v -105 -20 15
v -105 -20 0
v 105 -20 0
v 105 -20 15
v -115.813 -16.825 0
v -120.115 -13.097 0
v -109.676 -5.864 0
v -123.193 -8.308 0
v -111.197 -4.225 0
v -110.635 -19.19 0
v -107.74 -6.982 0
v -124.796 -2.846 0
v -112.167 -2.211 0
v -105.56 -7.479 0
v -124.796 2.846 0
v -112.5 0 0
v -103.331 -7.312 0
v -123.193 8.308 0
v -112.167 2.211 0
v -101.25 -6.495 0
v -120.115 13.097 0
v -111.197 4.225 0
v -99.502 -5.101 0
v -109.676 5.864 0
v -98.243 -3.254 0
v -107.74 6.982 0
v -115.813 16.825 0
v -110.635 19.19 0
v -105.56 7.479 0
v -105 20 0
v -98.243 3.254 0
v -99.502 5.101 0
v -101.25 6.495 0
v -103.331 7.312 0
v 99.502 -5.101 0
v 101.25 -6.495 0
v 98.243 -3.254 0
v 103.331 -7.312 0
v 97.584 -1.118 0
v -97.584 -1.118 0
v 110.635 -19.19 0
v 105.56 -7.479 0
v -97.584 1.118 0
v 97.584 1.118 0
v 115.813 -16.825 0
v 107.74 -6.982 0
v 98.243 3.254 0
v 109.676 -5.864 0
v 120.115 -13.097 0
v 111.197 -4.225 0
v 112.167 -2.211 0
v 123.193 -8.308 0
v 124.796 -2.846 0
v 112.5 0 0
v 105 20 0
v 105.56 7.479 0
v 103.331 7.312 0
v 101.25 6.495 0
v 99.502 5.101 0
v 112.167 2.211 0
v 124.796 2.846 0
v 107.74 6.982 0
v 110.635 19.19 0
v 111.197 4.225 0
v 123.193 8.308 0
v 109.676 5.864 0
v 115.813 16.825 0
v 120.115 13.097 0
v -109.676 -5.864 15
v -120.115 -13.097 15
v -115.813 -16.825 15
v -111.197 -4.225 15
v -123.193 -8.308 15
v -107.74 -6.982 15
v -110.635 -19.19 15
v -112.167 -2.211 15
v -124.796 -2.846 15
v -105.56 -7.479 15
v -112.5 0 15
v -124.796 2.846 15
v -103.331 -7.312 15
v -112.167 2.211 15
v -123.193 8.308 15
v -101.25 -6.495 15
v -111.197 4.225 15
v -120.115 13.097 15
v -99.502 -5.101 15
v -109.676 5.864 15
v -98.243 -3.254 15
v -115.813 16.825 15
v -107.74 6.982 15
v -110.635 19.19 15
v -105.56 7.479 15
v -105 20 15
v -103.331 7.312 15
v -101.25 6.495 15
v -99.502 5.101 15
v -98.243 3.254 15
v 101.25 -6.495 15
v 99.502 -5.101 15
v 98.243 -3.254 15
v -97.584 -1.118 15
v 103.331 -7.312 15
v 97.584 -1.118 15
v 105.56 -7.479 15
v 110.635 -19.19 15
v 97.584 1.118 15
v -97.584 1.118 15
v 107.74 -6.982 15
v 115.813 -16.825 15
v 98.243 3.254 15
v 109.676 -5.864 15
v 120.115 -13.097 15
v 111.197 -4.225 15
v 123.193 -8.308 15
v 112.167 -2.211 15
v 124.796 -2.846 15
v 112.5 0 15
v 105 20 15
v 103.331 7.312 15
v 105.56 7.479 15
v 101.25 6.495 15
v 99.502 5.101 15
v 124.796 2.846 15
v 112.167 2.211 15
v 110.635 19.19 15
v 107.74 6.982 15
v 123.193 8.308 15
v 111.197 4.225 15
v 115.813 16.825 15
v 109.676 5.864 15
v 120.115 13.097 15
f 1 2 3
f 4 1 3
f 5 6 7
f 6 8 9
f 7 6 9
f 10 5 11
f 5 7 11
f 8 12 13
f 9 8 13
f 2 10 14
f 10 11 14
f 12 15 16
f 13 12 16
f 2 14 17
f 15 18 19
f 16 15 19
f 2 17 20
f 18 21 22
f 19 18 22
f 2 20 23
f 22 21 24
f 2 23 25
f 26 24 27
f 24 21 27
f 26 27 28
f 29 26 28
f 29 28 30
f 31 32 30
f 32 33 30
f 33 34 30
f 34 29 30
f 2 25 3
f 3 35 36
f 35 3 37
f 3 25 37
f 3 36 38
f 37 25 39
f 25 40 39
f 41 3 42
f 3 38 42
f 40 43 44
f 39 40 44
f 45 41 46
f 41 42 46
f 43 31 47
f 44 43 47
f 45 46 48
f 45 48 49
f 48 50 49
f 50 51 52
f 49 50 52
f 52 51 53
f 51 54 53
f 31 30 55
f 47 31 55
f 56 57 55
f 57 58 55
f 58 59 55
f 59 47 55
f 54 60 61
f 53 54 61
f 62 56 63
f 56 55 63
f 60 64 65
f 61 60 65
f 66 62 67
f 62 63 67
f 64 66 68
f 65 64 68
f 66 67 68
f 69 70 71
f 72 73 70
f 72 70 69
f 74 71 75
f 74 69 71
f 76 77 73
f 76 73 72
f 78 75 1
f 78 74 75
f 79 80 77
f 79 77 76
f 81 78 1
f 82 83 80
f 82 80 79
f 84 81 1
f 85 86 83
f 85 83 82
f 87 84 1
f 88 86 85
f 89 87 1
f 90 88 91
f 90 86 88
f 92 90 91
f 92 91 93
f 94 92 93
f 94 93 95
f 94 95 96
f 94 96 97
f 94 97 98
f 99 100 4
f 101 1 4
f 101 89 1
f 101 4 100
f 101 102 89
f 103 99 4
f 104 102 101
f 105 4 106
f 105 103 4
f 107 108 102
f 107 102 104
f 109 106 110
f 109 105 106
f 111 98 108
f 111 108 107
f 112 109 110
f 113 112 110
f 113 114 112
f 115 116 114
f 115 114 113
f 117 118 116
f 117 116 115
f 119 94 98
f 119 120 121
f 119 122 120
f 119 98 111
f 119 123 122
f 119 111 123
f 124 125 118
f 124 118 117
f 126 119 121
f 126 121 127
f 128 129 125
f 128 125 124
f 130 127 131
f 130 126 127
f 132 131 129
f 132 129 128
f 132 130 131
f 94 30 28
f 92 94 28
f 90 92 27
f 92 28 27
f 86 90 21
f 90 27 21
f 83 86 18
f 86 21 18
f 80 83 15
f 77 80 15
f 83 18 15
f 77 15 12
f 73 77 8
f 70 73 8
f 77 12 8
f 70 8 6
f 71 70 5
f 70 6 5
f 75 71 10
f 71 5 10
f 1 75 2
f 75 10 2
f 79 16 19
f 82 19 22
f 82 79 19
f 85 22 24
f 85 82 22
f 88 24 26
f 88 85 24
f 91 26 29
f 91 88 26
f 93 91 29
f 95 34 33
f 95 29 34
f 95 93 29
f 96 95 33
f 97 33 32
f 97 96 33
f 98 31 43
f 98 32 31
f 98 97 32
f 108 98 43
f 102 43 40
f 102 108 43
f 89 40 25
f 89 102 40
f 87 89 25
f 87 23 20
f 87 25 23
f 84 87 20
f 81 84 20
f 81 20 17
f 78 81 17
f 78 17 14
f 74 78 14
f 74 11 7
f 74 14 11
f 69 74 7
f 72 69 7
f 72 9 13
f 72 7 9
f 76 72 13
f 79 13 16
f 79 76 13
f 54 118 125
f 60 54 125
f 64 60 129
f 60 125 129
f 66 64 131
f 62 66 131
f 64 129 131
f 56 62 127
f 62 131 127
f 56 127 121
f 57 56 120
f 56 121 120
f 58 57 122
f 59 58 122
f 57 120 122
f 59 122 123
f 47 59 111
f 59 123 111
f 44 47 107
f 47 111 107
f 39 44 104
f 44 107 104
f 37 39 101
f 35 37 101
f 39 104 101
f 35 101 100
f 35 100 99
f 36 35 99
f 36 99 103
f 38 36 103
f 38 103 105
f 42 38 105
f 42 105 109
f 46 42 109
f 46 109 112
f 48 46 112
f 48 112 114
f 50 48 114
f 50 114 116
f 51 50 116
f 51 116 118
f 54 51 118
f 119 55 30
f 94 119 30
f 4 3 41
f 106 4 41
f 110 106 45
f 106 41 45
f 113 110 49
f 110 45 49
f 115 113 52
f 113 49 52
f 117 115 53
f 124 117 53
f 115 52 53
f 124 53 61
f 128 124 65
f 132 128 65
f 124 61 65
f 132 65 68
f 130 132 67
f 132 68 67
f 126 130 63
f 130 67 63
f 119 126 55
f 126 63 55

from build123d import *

# Parameters (mm, degrees)
BOSS_EXTRUDE1_DEPTH = 15
SKETCH4_R           = 7.5
CUT_EXTRUDE1_DEPTH  = 128.47548784


with BuildPart() as part:
    # Sketch1 → Boss-Extrude1 (new body)
    with BuildSketch(Plane.XY):
        with BuildLine():
            Line((-105, -20), (105, -20))
            ThreePointArc((105, -20), (125, 0), (105, 20))
            Line((105, 20), (-105, 20))
            ThreePointArc((-105, 20), (-125, 0), (-105, -20))
        make_face()
    extrude(amount=BOSS_EXTRUDE1_DEPTH)

    # Sketch4 → Cut-Extrude1 (cut, through all)
    with BuildSketch(Plane.XY.offset(15)):
        with Locations((105, 0)):
            Circle(SKETCH4_R)
    cut_extrude1 = extrude(amount=-CUT_EXTRUDE1_DEPTH, mode=Mode.SUBTRACT)

    # Mirror1: Cut-Extrude1 across plane
    add(cut_extrude1.mirror(Plane(origin=(0, 0, 0), x_dir=(0, 0, 1), z_dir=(1, 0, 0))), mode=Mode.SUBTRACT)


solid = part.part
